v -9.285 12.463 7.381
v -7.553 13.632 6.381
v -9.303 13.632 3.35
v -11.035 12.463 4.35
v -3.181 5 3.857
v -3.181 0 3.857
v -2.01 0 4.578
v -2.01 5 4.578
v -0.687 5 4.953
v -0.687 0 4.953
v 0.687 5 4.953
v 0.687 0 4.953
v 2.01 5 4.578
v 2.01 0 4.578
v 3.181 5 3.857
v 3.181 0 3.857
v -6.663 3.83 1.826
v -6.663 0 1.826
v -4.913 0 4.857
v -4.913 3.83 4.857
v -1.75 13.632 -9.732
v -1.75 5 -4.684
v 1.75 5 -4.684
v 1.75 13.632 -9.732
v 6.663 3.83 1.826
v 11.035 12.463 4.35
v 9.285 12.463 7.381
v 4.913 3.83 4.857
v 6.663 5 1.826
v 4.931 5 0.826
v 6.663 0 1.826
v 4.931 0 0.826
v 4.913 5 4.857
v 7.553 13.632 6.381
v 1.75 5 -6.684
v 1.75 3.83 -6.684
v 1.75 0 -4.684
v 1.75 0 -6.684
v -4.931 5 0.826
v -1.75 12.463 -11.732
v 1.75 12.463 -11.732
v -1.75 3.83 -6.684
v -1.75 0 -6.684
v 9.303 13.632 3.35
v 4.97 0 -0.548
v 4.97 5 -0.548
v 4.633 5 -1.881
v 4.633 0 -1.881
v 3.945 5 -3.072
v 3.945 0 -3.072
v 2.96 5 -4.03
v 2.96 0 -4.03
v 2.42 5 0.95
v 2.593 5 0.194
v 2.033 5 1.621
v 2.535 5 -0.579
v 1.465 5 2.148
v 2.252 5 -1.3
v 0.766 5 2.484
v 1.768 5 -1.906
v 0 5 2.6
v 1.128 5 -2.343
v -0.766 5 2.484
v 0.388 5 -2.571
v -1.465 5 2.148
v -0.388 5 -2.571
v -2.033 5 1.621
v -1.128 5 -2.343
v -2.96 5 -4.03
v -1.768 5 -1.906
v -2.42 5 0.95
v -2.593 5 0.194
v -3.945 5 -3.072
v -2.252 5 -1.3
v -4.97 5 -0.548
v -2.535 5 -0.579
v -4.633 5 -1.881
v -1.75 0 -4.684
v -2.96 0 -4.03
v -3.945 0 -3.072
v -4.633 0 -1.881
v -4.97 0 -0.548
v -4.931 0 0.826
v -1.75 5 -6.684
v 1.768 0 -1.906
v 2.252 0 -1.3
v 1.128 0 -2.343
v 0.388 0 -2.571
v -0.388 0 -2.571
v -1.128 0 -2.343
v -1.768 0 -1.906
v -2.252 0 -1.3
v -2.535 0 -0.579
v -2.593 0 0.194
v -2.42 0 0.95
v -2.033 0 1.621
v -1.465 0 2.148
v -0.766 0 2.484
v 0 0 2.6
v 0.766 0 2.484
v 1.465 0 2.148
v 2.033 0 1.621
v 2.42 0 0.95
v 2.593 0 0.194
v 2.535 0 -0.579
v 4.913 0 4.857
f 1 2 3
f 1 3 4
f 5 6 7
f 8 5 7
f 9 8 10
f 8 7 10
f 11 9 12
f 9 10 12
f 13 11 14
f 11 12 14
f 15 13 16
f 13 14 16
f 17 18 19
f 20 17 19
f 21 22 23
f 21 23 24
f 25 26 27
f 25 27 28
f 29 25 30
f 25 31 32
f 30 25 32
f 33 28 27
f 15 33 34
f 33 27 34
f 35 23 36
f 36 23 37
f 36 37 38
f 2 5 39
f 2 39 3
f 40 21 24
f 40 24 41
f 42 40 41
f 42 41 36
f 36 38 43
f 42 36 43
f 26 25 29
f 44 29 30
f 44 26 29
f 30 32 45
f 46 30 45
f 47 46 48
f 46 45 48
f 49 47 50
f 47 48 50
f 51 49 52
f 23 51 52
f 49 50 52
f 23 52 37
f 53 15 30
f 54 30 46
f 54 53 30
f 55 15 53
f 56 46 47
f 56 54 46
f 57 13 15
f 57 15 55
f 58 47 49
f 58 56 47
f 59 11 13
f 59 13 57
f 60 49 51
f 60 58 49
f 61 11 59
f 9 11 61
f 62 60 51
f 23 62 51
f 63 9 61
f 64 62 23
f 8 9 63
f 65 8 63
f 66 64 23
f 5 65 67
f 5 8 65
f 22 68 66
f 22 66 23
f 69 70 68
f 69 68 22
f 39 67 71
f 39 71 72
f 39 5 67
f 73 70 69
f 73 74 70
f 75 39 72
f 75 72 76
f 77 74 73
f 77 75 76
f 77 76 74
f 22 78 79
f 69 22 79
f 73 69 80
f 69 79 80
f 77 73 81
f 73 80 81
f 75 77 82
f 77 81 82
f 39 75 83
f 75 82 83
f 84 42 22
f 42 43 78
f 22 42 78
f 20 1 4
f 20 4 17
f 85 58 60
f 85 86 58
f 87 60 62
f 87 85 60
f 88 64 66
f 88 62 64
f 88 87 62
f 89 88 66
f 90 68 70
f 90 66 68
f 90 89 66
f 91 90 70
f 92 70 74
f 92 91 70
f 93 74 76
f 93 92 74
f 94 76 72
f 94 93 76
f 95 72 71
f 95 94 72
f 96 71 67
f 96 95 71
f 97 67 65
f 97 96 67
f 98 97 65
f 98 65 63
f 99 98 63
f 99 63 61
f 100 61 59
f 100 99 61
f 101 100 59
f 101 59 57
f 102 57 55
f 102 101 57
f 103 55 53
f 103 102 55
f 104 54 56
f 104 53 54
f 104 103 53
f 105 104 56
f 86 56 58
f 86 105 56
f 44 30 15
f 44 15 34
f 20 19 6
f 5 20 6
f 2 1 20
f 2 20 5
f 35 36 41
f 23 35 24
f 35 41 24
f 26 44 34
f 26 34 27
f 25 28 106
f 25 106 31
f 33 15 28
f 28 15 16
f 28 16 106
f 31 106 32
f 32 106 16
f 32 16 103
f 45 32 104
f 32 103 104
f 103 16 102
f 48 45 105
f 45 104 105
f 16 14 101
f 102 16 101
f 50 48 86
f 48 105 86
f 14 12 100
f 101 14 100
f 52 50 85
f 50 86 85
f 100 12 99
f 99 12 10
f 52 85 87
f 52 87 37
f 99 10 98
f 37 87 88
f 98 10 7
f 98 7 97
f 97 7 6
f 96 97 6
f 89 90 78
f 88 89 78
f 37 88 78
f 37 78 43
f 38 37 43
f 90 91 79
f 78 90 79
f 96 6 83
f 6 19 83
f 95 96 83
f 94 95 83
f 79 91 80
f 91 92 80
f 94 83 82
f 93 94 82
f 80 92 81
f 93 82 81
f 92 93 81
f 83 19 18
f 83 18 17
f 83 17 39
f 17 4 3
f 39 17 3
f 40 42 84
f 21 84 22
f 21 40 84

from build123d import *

# Parameters (mm, degrees)
SKETCH_1_R               = 2.6
EXTRUDE_1_DEPTH          = 5
EXTRUDE_2_DEPTH          = 3.5
PATTERN_CIRCULAR_4_COUNT = 3


with BuildPart() as part:
    # 草图1 → 凸台-拉伸1 (new body)
    with BuildSketch(Plane(origin=(0, 0, 0), x_dir=(1, 0, 0), z_dir=(0, 1, 0))):
        with BuildLine():
            Line((-4.913295992, -4.857418706), (-3.181245185, -3.857418706))
            ThreePointArc((-3.181245185, -3.857418706), (0, -5), (3.181245185, -3.857418706))
            Line((3.181245185, -3.857418706), (4.913295992, -4.857418706))
            Line((4.913295992, -4.857418706), (6.663295992, -1.826329793))
            Line((6.663295992, -1.826329793), (4.931245185, -0.826329793))
            ThreePointArc((4.931245185, -0.826329793), (4.330127019, 2.5), (1.75, 4.683748499))
            Line((1.75, 4.683748499), (1.75, 6.683748499))
            Line((1.75, 6.683748499), (-1.75, 6.683748499))
            Line((-1.75, 6.683748499), (-1.75, 4.683748499))
            ThreePointArc((-1.75, 4.683748499), (-4.330127019, 2.5), (-4.931245185, -0.826329793))
            Line((-4.931245185, -0.826329793), (-6.663295992, -1.826329793))
            Line((-6.663295992, -1.826329793), (-4.913295992, -4.857418706))
        make_face()
        with Locations(Location((0, 0, 0), (0, 0, 270))):
            Circle(SKETCH_1_R, mode=Mode.SUBTRACT)
    extrude(amount=EXTRUDE_1_DEPTH)

    # 草图2 → 凸台-拉伸2 (add)
    with BuildSketch(Plane(origin=(0.875, 0, 1.515544457), x_dir=(0.8660254037844383, 0, -0.5000000000000009), z_dir=(0.5000000000000008, 0, 0.8660254037844382))):
        Polygon((-4.683748499, 5), (-9.731723247, 13.632378058), (-11.731723247, 12.462833649), (-6.683748499, 3.830455591), align=None)
    extrude(amount=-EXTRUDE_2_DEPTH)


with BuildPart() as pattern_circular_4_1:
    # 阵列(圆周)4: pattern copy
    add(part.part.rotate(Axis((0, 0, 0), (0, 1, 0)), 1 * 360 / PATTERN_CIRCULAR_4_COUNT))


with BuildPart() as pattern_circular_4_2:
    # 阵列(圆周)4: pattern copy
    add(part.part.rotate(Axis((0, 0, 0), (0, 1, 0)), 2 * 360 / PATTERN_CIRCULAR_4_COUNT))


with BuildPart() as pattern_circular_4_1_1:
    add(pattern_circular_4_1.part)

    # Combine 1: read off the stored shape, not the designer's step
    # Combine 1: union 阵列(圆周)4_2, part
    add(pattern_circular_4_2.part)
    add(part.part)


solid = pattern_circular_4_1_1.part
